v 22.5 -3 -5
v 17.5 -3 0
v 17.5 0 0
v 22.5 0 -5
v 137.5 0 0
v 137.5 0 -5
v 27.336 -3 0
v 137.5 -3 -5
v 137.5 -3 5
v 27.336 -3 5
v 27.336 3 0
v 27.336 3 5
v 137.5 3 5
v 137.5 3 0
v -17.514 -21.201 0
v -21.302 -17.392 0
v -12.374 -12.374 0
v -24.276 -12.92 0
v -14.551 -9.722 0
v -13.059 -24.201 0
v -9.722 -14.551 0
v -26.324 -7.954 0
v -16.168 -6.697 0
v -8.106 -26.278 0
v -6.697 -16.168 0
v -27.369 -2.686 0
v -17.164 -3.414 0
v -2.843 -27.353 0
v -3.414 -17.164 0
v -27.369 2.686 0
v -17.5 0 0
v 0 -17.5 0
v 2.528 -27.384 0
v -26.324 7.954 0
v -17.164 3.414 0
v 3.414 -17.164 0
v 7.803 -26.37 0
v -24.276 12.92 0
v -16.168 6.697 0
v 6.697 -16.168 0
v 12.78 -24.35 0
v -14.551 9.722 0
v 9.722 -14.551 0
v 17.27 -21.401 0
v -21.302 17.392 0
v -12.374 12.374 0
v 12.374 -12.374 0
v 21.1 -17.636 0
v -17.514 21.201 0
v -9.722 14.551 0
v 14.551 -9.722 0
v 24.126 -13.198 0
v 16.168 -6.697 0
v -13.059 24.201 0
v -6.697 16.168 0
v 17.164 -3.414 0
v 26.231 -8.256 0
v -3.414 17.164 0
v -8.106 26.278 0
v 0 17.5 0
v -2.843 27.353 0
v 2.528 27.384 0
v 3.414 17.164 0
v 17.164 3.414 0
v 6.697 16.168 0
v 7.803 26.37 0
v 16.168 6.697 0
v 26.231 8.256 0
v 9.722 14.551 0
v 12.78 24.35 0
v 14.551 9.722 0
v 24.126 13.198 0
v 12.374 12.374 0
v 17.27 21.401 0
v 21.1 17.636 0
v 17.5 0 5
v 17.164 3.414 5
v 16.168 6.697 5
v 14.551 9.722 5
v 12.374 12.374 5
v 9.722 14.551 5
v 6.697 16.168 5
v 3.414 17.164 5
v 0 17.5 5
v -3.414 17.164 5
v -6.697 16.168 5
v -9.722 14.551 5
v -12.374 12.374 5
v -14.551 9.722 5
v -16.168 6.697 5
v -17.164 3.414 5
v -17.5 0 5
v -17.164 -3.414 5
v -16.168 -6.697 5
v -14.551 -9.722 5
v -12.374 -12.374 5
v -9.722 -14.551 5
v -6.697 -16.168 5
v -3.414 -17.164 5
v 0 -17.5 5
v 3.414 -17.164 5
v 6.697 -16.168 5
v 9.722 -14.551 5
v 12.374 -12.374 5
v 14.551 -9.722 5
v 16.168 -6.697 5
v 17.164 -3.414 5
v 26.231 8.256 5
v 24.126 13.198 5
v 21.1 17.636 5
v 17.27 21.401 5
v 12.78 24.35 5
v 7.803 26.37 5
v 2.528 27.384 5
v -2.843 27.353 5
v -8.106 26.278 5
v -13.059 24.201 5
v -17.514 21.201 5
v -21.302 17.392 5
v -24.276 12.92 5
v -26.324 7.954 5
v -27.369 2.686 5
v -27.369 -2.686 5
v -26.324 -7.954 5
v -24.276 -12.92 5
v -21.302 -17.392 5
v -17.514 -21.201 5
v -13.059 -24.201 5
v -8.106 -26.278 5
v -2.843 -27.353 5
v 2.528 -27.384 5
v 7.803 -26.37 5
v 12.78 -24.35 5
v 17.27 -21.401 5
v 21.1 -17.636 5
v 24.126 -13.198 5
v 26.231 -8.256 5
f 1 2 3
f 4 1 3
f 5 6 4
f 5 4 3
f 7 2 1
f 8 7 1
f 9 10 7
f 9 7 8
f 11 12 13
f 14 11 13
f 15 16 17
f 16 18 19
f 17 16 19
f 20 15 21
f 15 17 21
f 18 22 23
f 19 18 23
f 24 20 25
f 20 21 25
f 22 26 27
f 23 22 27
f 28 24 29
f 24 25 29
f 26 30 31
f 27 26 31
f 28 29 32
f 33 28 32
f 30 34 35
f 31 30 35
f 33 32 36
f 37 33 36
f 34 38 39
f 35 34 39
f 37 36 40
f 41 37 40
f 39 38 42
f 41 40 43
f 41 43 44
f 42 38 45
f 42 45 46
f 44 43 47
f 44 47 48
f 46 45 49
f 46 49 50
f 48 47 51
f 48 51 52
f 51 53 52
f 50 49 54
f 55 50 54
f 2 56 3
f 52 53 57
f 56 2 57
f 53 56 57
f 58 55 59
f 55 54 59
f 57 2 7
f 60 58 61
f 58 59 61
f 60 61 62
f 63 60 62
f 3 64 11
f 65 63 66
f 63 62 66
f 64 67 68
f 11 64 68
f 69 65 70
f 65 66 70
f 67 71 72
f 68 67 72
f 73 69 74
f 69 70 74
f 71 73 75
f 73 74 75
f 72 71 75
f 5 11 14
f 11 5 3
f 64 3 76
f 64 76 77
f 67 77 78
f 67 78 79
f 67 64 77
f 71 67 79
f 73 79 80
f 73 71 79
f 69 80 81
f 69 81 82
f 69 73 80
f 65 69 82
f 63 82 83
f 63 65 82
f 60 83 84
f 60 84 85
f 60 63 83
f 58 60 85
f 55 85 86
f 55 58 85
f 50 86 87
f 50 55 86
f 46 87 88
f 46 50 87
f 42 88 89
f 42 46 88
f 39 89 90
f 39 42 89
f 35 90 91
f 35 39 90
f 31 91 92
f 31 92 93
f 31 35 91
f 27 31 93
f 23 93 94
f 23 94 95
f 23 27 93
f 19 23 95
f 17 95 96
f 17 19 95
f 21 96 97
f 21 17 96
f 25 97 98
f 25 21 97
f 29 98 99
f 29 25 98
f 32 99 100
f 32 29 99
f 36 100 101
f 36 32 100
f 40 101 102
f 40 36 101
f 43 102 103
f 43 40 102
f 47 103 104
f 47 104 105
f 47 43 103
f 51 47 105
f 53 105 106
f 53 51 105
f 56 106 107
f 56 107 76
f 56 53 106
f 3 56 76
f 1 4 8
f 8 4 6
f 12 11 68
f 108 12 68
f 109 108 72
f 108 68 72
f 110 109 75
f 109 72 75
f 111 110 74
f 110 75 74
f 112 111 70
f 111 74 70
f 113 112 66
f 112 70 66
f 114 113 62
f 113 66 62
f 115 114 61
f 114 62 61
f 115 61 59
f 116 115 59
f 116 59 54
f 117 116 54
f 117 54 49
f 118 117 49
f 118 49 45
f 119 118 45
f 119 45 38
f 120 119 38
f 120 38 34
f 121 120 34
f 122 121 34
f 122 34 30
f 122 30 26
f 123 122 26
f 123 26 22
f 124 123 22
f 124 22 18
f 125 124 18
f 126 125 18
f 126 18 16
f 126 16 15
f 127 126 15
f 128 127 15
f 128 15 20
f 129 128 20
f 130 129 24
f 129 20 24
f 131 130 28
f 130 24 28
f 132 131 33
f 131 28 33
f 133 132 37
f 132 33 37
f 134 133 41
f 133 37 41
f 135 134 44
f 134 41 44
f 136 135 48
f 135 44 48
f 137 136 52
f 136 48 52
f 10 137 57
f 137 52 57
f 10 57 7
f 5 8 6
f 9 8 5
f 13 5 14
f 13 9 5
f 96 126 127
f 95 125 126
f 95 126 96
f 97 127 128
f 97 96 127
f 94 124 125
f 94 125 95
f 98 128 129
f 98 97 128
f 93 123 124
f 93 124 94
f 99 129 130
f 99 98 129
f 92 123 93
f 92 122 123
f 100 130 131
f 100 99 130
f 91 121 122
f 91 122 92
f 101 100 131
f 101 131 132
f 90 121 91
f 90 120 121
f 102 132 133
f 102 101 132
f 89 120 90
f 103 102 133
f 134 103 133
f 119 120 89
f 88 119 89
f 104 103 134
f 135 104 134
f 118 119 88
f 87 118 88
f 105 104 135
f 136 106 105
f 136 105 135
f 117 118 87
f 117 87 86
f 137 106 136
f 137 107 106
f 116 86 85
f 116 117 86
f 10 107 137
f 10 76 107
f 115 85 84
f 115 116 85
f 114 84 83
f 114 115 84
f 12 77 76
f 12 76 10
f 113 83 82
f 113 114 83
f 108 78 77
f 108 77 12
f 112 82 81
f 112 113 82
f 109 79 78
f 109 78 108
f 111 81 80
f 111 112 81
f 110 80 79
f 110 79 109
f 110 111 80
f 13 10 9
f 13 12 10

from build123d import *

# Parameters (mm, degrees)
SKETCH1_R           = 27.5
SKETCH1_R_2         = 17.5
BOSS_EXTRUDE1_DEPTH = 5
SKETCH2_W           = 120
SKETCH2_H           = 6
BOSS_EXTRUDE2_DEPTH = 10
SKETCH3_W           = 5
SKETCH3_H           = 3
CUT_EXTRUDE1_DEPTH  = 140
CHAMFER1_SIZE       = 5


with BuildPart() as part:
    # Sketch1 → Boss-Extrude1 (new body)
    with BuildSketch(Plane.XY):
        Circle(SKETCH1_R)
        Circle(SKETCH1_R_2, mode=Mode.SUBTRACT)
    extrude(amount=BOSS_EXTRUDE1_DEPTH)

    # Sketch2 → Boss-Extrude2 (add)
    with BuildSketch(Plane.XY.offset(5)):
        with Locations((77.5, 0)):
            Rectangle(SKETCH2_W, SKETCH2_H)
    extrude(amount=-BOSS_EXTRUDE2_DEPTH)

    # Sketch3 → Cut-Extrude1 (cut)
    with BuildSketch(Plane.ZY.offset(-17.5)):
        with Locations((-2.5, 1.5)):
            Rectangle(SKETCH3_W, SKETCH3_H)
    extrude(amount=-CUT_EXTRUDE1_DEPTH, mode=Mode.SUBTRACT)

    # Chamfer1
    chamfer1_edges = [part.edges().sort_by_distance(p)[0] for p in [
        (17.5, -1.5, -5),
    ]]
    chamfer(chamfer1_edges, length=CHAMFER1_SIZE - 0.0001)  # a hair under: the kernel refuses the full size


solid = part.part
